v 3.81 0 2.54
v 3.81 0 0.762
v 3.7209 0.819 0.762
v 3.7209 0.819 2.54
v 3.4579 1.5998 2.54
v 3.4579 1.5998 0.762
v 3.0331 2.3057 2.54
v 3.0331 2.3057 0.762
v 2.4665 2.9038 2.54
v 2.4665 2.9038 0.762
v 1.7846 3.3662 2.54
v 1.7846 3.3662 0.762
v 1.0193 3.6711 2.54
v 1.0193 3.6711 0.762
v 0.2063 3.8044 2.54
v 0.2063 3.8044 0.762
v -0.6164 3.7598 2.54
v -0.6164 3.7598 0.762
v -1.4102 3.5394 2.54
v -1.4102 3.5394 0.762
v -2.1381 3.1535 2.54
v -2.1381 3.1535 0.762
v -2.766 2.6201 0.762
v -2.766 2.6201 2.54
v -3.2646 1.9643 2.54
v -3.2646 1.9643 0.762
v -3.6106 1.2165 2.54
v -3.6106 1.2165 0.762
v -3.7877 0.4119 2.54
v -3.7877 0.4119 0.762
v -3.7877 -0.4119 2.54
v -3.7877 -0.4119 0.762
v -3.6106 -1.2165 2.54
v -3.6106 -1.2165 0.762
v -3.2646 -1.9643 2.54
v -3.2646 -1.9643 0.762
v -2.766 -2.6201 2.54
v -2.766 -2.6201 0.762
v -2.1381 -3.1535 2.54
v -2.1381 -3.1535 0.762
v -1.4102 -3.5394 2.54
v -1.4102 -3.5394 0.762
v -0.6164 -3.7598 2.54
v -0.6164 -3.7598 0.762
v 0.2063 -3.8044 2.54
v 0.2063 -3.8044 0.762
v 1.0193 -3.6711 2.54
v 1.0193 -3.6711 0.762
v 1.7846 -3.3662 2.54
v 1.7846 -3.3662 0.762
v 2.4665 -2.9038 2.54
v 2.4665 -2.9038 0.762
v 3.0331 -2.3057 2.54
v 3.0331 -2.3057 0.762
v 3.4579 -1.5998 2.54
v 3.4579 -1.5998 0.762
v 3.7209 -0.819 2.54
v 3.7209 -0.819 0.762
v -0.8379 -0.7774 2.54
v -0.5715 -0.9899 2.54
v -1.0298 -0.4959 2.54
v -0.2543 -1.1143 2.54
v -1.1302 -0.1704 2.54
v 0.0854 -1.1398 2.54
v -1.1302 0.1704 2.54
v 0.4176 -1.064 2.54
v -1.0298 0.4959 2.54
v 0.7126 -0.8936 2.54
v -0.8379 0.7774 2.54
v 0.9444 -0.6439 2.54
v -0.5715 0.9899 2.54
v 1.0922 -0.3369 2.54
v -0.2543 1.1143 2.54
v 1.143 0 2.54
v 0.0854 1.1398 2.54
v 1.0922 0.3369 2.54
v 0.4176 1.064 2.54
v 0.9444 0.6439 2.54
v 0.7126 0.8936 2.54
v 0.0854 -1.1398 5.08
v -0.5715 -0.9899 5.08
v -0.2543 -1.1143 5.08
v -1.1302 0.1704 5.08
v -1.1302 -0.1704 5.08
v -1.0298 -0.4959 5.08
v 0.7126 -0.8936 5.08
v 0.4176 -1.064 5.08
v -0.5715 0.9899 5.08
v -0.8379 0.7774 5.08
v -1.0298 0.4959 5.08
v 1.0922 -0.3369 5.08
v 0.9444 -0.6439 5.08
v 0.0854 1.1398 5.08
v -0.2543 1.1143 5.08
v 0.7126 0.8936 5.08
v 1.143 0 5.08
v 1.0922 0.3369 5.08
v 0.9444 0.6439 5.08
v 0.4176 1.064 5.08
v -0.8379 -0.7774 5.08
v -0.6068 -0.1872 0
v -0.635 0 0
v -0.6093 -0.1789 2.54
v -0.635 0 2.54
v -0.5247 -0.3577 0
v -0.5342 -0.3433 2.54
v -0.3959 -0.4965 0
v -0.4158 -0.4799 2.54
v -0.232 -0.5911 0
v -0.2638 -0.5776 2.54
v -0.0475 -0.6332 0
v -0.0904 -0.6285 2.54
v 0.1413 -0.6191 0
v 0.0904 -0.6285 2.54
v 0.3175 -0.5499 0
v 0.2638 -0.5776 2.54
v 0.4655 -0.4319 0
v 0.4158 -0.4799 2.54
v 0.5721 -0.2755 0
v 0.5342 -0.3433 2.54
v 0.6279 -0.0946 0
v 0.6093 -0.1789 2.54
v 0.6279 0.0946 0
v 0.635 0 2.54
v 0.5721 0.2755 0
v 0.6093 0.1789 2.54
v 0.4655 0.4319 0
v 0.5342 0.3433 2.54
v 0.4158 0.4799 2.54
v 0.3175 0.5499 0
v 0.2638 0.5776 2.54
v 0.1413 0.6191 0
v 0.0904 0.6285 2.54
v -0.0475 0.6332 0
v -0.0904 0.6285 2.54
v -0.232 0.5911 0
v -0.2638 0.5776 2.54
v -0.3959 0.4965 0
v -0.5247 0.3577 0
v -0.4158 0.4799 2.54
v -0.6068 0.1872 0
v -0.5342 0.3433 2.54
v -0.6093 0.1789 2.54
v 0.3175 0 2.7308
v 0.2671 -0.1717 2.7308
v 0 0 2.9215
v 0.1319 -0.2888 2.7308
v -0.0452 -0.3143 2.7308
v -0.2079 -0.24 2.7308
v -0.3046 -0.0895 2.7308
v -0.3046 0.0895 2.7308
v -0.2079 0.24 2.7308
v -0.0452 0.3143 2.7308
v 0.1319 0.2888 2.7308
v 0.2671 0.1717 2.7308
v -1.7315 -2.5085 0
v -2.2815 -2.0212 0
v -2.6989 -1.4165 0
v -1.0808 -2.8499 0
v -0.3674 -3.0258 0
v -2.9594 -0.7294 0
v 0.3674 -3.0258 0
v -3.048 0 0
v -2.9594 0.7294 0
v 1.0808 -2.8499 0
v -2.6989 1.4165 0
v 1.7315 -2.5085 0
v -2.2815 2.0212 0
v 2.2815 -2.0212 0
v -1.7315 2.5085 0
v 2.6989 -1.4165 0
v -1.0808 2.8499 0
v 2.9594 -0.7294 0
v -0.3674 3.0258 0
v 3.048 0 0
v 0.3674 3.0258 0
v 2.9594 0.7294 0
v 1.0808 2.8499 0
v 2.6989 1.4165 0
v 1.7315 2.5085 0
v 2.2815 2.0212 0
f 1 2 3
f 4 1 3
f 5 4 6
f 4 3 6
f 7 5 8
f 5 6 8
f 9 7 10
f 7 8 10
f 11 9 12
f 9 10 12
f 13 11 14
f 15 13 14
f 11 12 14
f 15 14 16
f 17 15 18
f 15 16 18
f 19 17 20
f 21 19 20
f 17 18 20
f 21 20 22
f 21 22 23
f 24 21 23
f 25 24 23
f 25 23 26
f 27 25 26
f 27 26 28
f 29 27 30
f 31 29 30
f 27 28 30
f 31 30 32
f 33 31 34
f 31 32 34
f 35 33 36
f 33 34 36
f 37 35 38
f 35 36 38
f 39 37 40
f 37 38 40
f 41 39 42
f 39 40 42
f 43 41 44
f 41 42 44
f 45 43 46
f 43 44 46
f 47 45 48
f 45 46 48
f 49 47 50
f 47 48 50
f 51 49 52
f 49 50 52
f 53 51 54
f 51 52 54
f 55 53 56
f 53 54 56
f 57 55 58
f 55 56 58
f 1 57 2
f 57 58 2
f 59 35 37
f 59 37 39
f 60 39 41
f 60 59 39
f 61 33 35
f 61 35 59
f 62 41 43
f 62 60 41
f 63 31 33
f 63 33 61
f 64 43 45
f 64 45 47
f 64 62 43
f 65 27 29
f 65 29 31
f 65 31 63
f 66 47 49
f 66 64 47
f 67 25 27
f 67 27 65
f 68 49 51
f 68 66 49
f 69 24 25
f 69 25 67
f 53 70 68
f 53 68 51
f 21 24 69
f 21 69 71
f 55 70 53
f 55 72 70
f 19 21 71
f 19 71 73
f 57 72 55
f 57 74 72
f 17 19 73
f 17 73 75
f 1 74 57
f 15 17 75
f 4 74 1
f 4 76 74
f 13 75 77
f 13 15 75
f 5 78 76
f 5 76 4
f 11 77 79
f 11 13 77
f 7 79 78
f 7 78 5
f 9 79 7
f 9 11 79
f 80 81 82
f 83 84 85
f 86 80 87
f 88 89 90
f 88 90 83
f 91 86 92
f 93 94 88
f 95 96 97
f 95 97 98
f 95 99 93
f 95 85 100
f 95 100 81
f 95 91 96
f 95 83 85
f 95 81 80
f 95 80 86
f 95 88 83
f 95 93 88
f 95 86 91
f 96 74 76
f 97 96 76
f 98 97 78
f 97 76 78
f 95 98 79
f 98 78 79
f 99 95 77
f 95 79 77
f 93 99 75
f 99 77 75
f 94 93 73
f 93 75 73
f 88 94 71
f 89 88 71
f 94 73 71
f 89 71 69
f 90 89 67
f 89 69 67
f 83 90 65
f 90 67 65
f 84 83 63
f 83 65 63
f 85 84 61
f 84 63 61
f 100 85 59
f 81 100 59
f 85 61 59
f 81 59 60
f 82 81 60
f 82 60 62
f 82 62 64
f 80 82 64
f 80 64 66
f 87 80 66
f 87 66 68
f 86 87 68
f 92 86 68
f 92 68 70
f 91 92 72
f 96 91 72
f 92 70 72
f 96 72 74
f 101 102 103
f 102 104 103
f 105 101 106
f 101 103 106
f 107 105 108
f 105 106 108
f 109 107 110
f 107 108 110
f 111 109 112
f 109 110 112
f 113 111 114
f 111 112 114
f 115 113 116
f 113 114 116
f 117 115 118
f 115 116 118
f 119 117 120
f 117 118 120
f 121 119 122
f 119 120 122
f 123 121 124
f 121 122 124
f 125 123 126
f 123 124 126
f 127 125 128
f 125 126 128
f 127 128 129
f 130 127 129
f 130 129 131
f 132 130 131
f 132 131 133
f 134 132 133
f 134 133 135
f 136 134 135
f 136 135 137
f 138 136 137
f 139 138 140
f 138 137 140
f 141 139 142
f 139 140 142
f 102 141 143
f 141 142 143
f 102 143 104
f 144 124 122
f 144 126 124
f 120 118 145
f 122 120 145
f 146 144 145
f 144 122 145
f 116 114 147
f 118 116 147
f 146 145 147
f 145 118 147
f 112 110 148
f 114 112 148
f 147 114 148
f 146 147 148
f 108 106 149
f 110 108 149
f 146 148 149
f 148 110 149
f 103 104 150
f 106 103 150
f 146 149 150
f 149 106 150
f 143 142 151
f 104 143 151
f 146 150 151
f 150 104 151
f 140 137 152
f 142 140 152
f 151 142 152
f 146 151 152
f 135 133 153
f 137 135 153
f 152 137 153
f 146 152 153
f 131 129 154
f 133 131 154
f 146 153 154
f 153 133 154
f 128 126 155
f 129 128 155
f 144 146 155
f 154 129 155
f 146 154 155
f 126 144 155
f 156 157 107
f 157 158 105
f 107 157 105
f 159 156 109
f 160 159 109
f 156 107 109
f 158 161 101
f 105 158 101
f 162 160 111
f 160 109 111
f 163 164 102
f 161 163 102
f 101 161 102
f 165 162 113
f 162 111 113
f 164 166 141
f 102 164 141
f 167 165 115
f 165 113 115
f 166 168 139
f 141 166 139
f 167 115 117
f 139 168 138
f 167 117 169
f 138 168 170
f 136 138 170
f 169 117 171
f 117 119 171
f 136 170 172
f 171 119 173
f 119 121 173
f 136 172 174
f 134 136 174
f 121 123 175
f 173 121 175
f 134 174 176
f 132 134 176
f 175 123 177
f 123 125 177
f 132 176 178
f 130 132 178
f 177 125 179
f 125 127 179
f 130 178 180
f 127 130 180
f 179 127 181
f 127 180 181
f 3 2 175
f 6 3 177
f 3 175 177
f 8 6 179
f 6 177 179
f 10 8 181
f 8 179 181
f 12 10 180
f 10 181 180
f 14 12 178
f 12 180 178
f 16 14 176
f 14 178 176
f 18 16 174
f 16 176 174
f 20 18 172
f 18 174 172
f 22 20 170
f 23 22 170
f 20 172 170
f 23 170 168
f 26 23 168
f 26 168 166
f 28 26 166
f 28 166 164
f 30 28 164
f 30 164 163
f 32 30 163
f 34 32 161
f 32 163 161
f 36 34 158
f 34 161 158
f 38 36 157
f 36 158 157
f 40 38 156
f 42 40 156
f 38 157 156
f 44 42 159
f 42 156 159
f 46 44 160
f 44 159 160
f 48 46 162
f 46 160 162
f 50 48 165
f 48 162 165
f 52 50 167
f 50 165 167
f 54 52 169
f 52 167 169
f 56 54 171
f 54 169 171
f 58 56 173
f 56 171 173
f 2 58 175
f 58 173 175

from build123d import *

# Parameters (mm, degrees)
F0_R     = 3.81
F1_DEPTH = 2.54
F2_R     = 1.143
F3_DEPTH = 2.54
F5_D     = 1.27
F5_DEPTH = 2.54
F5_TIP   = 0.3815464931
F6_SIZE  = 0.762


with BuildPart() as f1:
    # F0 (on Top) → F1 (new body)
    with BuildSketch(Plane.XY):
        Circle(F0_R)
    extrude(amount=F1_DEPTH)

    # F2 (on face) → F3 (join)
    with BuildSketch(Plane.XY.offset(2.54)):
        Circle(F2_R)
    extrude(amount=F3_DEPTH)

    # F5
    with Locations(Plane(origin=(0, 0, 0), x_dir=(1, 0, 0), z_dir=(0, 0, -1))):
        with Locations((0, 0)):
            Hole(F5_D / 2, depth=F5_DEPTH)
            with Locations((0, 0, -(F5_DEPTH + F5_TIP / 2))):  # 118° drill point
                Cone(0, F5_D / 2, F5_TIP, mode=Mode.SUBTRACT)

    # F6
    f6_edges = [f1.edges().sort_by_distance(p)[0] for p in [
        (-3.81, 0, 0),
    ]]
    chamfer(f6_edges, length=F6_SIZE)


solid = f1.part
